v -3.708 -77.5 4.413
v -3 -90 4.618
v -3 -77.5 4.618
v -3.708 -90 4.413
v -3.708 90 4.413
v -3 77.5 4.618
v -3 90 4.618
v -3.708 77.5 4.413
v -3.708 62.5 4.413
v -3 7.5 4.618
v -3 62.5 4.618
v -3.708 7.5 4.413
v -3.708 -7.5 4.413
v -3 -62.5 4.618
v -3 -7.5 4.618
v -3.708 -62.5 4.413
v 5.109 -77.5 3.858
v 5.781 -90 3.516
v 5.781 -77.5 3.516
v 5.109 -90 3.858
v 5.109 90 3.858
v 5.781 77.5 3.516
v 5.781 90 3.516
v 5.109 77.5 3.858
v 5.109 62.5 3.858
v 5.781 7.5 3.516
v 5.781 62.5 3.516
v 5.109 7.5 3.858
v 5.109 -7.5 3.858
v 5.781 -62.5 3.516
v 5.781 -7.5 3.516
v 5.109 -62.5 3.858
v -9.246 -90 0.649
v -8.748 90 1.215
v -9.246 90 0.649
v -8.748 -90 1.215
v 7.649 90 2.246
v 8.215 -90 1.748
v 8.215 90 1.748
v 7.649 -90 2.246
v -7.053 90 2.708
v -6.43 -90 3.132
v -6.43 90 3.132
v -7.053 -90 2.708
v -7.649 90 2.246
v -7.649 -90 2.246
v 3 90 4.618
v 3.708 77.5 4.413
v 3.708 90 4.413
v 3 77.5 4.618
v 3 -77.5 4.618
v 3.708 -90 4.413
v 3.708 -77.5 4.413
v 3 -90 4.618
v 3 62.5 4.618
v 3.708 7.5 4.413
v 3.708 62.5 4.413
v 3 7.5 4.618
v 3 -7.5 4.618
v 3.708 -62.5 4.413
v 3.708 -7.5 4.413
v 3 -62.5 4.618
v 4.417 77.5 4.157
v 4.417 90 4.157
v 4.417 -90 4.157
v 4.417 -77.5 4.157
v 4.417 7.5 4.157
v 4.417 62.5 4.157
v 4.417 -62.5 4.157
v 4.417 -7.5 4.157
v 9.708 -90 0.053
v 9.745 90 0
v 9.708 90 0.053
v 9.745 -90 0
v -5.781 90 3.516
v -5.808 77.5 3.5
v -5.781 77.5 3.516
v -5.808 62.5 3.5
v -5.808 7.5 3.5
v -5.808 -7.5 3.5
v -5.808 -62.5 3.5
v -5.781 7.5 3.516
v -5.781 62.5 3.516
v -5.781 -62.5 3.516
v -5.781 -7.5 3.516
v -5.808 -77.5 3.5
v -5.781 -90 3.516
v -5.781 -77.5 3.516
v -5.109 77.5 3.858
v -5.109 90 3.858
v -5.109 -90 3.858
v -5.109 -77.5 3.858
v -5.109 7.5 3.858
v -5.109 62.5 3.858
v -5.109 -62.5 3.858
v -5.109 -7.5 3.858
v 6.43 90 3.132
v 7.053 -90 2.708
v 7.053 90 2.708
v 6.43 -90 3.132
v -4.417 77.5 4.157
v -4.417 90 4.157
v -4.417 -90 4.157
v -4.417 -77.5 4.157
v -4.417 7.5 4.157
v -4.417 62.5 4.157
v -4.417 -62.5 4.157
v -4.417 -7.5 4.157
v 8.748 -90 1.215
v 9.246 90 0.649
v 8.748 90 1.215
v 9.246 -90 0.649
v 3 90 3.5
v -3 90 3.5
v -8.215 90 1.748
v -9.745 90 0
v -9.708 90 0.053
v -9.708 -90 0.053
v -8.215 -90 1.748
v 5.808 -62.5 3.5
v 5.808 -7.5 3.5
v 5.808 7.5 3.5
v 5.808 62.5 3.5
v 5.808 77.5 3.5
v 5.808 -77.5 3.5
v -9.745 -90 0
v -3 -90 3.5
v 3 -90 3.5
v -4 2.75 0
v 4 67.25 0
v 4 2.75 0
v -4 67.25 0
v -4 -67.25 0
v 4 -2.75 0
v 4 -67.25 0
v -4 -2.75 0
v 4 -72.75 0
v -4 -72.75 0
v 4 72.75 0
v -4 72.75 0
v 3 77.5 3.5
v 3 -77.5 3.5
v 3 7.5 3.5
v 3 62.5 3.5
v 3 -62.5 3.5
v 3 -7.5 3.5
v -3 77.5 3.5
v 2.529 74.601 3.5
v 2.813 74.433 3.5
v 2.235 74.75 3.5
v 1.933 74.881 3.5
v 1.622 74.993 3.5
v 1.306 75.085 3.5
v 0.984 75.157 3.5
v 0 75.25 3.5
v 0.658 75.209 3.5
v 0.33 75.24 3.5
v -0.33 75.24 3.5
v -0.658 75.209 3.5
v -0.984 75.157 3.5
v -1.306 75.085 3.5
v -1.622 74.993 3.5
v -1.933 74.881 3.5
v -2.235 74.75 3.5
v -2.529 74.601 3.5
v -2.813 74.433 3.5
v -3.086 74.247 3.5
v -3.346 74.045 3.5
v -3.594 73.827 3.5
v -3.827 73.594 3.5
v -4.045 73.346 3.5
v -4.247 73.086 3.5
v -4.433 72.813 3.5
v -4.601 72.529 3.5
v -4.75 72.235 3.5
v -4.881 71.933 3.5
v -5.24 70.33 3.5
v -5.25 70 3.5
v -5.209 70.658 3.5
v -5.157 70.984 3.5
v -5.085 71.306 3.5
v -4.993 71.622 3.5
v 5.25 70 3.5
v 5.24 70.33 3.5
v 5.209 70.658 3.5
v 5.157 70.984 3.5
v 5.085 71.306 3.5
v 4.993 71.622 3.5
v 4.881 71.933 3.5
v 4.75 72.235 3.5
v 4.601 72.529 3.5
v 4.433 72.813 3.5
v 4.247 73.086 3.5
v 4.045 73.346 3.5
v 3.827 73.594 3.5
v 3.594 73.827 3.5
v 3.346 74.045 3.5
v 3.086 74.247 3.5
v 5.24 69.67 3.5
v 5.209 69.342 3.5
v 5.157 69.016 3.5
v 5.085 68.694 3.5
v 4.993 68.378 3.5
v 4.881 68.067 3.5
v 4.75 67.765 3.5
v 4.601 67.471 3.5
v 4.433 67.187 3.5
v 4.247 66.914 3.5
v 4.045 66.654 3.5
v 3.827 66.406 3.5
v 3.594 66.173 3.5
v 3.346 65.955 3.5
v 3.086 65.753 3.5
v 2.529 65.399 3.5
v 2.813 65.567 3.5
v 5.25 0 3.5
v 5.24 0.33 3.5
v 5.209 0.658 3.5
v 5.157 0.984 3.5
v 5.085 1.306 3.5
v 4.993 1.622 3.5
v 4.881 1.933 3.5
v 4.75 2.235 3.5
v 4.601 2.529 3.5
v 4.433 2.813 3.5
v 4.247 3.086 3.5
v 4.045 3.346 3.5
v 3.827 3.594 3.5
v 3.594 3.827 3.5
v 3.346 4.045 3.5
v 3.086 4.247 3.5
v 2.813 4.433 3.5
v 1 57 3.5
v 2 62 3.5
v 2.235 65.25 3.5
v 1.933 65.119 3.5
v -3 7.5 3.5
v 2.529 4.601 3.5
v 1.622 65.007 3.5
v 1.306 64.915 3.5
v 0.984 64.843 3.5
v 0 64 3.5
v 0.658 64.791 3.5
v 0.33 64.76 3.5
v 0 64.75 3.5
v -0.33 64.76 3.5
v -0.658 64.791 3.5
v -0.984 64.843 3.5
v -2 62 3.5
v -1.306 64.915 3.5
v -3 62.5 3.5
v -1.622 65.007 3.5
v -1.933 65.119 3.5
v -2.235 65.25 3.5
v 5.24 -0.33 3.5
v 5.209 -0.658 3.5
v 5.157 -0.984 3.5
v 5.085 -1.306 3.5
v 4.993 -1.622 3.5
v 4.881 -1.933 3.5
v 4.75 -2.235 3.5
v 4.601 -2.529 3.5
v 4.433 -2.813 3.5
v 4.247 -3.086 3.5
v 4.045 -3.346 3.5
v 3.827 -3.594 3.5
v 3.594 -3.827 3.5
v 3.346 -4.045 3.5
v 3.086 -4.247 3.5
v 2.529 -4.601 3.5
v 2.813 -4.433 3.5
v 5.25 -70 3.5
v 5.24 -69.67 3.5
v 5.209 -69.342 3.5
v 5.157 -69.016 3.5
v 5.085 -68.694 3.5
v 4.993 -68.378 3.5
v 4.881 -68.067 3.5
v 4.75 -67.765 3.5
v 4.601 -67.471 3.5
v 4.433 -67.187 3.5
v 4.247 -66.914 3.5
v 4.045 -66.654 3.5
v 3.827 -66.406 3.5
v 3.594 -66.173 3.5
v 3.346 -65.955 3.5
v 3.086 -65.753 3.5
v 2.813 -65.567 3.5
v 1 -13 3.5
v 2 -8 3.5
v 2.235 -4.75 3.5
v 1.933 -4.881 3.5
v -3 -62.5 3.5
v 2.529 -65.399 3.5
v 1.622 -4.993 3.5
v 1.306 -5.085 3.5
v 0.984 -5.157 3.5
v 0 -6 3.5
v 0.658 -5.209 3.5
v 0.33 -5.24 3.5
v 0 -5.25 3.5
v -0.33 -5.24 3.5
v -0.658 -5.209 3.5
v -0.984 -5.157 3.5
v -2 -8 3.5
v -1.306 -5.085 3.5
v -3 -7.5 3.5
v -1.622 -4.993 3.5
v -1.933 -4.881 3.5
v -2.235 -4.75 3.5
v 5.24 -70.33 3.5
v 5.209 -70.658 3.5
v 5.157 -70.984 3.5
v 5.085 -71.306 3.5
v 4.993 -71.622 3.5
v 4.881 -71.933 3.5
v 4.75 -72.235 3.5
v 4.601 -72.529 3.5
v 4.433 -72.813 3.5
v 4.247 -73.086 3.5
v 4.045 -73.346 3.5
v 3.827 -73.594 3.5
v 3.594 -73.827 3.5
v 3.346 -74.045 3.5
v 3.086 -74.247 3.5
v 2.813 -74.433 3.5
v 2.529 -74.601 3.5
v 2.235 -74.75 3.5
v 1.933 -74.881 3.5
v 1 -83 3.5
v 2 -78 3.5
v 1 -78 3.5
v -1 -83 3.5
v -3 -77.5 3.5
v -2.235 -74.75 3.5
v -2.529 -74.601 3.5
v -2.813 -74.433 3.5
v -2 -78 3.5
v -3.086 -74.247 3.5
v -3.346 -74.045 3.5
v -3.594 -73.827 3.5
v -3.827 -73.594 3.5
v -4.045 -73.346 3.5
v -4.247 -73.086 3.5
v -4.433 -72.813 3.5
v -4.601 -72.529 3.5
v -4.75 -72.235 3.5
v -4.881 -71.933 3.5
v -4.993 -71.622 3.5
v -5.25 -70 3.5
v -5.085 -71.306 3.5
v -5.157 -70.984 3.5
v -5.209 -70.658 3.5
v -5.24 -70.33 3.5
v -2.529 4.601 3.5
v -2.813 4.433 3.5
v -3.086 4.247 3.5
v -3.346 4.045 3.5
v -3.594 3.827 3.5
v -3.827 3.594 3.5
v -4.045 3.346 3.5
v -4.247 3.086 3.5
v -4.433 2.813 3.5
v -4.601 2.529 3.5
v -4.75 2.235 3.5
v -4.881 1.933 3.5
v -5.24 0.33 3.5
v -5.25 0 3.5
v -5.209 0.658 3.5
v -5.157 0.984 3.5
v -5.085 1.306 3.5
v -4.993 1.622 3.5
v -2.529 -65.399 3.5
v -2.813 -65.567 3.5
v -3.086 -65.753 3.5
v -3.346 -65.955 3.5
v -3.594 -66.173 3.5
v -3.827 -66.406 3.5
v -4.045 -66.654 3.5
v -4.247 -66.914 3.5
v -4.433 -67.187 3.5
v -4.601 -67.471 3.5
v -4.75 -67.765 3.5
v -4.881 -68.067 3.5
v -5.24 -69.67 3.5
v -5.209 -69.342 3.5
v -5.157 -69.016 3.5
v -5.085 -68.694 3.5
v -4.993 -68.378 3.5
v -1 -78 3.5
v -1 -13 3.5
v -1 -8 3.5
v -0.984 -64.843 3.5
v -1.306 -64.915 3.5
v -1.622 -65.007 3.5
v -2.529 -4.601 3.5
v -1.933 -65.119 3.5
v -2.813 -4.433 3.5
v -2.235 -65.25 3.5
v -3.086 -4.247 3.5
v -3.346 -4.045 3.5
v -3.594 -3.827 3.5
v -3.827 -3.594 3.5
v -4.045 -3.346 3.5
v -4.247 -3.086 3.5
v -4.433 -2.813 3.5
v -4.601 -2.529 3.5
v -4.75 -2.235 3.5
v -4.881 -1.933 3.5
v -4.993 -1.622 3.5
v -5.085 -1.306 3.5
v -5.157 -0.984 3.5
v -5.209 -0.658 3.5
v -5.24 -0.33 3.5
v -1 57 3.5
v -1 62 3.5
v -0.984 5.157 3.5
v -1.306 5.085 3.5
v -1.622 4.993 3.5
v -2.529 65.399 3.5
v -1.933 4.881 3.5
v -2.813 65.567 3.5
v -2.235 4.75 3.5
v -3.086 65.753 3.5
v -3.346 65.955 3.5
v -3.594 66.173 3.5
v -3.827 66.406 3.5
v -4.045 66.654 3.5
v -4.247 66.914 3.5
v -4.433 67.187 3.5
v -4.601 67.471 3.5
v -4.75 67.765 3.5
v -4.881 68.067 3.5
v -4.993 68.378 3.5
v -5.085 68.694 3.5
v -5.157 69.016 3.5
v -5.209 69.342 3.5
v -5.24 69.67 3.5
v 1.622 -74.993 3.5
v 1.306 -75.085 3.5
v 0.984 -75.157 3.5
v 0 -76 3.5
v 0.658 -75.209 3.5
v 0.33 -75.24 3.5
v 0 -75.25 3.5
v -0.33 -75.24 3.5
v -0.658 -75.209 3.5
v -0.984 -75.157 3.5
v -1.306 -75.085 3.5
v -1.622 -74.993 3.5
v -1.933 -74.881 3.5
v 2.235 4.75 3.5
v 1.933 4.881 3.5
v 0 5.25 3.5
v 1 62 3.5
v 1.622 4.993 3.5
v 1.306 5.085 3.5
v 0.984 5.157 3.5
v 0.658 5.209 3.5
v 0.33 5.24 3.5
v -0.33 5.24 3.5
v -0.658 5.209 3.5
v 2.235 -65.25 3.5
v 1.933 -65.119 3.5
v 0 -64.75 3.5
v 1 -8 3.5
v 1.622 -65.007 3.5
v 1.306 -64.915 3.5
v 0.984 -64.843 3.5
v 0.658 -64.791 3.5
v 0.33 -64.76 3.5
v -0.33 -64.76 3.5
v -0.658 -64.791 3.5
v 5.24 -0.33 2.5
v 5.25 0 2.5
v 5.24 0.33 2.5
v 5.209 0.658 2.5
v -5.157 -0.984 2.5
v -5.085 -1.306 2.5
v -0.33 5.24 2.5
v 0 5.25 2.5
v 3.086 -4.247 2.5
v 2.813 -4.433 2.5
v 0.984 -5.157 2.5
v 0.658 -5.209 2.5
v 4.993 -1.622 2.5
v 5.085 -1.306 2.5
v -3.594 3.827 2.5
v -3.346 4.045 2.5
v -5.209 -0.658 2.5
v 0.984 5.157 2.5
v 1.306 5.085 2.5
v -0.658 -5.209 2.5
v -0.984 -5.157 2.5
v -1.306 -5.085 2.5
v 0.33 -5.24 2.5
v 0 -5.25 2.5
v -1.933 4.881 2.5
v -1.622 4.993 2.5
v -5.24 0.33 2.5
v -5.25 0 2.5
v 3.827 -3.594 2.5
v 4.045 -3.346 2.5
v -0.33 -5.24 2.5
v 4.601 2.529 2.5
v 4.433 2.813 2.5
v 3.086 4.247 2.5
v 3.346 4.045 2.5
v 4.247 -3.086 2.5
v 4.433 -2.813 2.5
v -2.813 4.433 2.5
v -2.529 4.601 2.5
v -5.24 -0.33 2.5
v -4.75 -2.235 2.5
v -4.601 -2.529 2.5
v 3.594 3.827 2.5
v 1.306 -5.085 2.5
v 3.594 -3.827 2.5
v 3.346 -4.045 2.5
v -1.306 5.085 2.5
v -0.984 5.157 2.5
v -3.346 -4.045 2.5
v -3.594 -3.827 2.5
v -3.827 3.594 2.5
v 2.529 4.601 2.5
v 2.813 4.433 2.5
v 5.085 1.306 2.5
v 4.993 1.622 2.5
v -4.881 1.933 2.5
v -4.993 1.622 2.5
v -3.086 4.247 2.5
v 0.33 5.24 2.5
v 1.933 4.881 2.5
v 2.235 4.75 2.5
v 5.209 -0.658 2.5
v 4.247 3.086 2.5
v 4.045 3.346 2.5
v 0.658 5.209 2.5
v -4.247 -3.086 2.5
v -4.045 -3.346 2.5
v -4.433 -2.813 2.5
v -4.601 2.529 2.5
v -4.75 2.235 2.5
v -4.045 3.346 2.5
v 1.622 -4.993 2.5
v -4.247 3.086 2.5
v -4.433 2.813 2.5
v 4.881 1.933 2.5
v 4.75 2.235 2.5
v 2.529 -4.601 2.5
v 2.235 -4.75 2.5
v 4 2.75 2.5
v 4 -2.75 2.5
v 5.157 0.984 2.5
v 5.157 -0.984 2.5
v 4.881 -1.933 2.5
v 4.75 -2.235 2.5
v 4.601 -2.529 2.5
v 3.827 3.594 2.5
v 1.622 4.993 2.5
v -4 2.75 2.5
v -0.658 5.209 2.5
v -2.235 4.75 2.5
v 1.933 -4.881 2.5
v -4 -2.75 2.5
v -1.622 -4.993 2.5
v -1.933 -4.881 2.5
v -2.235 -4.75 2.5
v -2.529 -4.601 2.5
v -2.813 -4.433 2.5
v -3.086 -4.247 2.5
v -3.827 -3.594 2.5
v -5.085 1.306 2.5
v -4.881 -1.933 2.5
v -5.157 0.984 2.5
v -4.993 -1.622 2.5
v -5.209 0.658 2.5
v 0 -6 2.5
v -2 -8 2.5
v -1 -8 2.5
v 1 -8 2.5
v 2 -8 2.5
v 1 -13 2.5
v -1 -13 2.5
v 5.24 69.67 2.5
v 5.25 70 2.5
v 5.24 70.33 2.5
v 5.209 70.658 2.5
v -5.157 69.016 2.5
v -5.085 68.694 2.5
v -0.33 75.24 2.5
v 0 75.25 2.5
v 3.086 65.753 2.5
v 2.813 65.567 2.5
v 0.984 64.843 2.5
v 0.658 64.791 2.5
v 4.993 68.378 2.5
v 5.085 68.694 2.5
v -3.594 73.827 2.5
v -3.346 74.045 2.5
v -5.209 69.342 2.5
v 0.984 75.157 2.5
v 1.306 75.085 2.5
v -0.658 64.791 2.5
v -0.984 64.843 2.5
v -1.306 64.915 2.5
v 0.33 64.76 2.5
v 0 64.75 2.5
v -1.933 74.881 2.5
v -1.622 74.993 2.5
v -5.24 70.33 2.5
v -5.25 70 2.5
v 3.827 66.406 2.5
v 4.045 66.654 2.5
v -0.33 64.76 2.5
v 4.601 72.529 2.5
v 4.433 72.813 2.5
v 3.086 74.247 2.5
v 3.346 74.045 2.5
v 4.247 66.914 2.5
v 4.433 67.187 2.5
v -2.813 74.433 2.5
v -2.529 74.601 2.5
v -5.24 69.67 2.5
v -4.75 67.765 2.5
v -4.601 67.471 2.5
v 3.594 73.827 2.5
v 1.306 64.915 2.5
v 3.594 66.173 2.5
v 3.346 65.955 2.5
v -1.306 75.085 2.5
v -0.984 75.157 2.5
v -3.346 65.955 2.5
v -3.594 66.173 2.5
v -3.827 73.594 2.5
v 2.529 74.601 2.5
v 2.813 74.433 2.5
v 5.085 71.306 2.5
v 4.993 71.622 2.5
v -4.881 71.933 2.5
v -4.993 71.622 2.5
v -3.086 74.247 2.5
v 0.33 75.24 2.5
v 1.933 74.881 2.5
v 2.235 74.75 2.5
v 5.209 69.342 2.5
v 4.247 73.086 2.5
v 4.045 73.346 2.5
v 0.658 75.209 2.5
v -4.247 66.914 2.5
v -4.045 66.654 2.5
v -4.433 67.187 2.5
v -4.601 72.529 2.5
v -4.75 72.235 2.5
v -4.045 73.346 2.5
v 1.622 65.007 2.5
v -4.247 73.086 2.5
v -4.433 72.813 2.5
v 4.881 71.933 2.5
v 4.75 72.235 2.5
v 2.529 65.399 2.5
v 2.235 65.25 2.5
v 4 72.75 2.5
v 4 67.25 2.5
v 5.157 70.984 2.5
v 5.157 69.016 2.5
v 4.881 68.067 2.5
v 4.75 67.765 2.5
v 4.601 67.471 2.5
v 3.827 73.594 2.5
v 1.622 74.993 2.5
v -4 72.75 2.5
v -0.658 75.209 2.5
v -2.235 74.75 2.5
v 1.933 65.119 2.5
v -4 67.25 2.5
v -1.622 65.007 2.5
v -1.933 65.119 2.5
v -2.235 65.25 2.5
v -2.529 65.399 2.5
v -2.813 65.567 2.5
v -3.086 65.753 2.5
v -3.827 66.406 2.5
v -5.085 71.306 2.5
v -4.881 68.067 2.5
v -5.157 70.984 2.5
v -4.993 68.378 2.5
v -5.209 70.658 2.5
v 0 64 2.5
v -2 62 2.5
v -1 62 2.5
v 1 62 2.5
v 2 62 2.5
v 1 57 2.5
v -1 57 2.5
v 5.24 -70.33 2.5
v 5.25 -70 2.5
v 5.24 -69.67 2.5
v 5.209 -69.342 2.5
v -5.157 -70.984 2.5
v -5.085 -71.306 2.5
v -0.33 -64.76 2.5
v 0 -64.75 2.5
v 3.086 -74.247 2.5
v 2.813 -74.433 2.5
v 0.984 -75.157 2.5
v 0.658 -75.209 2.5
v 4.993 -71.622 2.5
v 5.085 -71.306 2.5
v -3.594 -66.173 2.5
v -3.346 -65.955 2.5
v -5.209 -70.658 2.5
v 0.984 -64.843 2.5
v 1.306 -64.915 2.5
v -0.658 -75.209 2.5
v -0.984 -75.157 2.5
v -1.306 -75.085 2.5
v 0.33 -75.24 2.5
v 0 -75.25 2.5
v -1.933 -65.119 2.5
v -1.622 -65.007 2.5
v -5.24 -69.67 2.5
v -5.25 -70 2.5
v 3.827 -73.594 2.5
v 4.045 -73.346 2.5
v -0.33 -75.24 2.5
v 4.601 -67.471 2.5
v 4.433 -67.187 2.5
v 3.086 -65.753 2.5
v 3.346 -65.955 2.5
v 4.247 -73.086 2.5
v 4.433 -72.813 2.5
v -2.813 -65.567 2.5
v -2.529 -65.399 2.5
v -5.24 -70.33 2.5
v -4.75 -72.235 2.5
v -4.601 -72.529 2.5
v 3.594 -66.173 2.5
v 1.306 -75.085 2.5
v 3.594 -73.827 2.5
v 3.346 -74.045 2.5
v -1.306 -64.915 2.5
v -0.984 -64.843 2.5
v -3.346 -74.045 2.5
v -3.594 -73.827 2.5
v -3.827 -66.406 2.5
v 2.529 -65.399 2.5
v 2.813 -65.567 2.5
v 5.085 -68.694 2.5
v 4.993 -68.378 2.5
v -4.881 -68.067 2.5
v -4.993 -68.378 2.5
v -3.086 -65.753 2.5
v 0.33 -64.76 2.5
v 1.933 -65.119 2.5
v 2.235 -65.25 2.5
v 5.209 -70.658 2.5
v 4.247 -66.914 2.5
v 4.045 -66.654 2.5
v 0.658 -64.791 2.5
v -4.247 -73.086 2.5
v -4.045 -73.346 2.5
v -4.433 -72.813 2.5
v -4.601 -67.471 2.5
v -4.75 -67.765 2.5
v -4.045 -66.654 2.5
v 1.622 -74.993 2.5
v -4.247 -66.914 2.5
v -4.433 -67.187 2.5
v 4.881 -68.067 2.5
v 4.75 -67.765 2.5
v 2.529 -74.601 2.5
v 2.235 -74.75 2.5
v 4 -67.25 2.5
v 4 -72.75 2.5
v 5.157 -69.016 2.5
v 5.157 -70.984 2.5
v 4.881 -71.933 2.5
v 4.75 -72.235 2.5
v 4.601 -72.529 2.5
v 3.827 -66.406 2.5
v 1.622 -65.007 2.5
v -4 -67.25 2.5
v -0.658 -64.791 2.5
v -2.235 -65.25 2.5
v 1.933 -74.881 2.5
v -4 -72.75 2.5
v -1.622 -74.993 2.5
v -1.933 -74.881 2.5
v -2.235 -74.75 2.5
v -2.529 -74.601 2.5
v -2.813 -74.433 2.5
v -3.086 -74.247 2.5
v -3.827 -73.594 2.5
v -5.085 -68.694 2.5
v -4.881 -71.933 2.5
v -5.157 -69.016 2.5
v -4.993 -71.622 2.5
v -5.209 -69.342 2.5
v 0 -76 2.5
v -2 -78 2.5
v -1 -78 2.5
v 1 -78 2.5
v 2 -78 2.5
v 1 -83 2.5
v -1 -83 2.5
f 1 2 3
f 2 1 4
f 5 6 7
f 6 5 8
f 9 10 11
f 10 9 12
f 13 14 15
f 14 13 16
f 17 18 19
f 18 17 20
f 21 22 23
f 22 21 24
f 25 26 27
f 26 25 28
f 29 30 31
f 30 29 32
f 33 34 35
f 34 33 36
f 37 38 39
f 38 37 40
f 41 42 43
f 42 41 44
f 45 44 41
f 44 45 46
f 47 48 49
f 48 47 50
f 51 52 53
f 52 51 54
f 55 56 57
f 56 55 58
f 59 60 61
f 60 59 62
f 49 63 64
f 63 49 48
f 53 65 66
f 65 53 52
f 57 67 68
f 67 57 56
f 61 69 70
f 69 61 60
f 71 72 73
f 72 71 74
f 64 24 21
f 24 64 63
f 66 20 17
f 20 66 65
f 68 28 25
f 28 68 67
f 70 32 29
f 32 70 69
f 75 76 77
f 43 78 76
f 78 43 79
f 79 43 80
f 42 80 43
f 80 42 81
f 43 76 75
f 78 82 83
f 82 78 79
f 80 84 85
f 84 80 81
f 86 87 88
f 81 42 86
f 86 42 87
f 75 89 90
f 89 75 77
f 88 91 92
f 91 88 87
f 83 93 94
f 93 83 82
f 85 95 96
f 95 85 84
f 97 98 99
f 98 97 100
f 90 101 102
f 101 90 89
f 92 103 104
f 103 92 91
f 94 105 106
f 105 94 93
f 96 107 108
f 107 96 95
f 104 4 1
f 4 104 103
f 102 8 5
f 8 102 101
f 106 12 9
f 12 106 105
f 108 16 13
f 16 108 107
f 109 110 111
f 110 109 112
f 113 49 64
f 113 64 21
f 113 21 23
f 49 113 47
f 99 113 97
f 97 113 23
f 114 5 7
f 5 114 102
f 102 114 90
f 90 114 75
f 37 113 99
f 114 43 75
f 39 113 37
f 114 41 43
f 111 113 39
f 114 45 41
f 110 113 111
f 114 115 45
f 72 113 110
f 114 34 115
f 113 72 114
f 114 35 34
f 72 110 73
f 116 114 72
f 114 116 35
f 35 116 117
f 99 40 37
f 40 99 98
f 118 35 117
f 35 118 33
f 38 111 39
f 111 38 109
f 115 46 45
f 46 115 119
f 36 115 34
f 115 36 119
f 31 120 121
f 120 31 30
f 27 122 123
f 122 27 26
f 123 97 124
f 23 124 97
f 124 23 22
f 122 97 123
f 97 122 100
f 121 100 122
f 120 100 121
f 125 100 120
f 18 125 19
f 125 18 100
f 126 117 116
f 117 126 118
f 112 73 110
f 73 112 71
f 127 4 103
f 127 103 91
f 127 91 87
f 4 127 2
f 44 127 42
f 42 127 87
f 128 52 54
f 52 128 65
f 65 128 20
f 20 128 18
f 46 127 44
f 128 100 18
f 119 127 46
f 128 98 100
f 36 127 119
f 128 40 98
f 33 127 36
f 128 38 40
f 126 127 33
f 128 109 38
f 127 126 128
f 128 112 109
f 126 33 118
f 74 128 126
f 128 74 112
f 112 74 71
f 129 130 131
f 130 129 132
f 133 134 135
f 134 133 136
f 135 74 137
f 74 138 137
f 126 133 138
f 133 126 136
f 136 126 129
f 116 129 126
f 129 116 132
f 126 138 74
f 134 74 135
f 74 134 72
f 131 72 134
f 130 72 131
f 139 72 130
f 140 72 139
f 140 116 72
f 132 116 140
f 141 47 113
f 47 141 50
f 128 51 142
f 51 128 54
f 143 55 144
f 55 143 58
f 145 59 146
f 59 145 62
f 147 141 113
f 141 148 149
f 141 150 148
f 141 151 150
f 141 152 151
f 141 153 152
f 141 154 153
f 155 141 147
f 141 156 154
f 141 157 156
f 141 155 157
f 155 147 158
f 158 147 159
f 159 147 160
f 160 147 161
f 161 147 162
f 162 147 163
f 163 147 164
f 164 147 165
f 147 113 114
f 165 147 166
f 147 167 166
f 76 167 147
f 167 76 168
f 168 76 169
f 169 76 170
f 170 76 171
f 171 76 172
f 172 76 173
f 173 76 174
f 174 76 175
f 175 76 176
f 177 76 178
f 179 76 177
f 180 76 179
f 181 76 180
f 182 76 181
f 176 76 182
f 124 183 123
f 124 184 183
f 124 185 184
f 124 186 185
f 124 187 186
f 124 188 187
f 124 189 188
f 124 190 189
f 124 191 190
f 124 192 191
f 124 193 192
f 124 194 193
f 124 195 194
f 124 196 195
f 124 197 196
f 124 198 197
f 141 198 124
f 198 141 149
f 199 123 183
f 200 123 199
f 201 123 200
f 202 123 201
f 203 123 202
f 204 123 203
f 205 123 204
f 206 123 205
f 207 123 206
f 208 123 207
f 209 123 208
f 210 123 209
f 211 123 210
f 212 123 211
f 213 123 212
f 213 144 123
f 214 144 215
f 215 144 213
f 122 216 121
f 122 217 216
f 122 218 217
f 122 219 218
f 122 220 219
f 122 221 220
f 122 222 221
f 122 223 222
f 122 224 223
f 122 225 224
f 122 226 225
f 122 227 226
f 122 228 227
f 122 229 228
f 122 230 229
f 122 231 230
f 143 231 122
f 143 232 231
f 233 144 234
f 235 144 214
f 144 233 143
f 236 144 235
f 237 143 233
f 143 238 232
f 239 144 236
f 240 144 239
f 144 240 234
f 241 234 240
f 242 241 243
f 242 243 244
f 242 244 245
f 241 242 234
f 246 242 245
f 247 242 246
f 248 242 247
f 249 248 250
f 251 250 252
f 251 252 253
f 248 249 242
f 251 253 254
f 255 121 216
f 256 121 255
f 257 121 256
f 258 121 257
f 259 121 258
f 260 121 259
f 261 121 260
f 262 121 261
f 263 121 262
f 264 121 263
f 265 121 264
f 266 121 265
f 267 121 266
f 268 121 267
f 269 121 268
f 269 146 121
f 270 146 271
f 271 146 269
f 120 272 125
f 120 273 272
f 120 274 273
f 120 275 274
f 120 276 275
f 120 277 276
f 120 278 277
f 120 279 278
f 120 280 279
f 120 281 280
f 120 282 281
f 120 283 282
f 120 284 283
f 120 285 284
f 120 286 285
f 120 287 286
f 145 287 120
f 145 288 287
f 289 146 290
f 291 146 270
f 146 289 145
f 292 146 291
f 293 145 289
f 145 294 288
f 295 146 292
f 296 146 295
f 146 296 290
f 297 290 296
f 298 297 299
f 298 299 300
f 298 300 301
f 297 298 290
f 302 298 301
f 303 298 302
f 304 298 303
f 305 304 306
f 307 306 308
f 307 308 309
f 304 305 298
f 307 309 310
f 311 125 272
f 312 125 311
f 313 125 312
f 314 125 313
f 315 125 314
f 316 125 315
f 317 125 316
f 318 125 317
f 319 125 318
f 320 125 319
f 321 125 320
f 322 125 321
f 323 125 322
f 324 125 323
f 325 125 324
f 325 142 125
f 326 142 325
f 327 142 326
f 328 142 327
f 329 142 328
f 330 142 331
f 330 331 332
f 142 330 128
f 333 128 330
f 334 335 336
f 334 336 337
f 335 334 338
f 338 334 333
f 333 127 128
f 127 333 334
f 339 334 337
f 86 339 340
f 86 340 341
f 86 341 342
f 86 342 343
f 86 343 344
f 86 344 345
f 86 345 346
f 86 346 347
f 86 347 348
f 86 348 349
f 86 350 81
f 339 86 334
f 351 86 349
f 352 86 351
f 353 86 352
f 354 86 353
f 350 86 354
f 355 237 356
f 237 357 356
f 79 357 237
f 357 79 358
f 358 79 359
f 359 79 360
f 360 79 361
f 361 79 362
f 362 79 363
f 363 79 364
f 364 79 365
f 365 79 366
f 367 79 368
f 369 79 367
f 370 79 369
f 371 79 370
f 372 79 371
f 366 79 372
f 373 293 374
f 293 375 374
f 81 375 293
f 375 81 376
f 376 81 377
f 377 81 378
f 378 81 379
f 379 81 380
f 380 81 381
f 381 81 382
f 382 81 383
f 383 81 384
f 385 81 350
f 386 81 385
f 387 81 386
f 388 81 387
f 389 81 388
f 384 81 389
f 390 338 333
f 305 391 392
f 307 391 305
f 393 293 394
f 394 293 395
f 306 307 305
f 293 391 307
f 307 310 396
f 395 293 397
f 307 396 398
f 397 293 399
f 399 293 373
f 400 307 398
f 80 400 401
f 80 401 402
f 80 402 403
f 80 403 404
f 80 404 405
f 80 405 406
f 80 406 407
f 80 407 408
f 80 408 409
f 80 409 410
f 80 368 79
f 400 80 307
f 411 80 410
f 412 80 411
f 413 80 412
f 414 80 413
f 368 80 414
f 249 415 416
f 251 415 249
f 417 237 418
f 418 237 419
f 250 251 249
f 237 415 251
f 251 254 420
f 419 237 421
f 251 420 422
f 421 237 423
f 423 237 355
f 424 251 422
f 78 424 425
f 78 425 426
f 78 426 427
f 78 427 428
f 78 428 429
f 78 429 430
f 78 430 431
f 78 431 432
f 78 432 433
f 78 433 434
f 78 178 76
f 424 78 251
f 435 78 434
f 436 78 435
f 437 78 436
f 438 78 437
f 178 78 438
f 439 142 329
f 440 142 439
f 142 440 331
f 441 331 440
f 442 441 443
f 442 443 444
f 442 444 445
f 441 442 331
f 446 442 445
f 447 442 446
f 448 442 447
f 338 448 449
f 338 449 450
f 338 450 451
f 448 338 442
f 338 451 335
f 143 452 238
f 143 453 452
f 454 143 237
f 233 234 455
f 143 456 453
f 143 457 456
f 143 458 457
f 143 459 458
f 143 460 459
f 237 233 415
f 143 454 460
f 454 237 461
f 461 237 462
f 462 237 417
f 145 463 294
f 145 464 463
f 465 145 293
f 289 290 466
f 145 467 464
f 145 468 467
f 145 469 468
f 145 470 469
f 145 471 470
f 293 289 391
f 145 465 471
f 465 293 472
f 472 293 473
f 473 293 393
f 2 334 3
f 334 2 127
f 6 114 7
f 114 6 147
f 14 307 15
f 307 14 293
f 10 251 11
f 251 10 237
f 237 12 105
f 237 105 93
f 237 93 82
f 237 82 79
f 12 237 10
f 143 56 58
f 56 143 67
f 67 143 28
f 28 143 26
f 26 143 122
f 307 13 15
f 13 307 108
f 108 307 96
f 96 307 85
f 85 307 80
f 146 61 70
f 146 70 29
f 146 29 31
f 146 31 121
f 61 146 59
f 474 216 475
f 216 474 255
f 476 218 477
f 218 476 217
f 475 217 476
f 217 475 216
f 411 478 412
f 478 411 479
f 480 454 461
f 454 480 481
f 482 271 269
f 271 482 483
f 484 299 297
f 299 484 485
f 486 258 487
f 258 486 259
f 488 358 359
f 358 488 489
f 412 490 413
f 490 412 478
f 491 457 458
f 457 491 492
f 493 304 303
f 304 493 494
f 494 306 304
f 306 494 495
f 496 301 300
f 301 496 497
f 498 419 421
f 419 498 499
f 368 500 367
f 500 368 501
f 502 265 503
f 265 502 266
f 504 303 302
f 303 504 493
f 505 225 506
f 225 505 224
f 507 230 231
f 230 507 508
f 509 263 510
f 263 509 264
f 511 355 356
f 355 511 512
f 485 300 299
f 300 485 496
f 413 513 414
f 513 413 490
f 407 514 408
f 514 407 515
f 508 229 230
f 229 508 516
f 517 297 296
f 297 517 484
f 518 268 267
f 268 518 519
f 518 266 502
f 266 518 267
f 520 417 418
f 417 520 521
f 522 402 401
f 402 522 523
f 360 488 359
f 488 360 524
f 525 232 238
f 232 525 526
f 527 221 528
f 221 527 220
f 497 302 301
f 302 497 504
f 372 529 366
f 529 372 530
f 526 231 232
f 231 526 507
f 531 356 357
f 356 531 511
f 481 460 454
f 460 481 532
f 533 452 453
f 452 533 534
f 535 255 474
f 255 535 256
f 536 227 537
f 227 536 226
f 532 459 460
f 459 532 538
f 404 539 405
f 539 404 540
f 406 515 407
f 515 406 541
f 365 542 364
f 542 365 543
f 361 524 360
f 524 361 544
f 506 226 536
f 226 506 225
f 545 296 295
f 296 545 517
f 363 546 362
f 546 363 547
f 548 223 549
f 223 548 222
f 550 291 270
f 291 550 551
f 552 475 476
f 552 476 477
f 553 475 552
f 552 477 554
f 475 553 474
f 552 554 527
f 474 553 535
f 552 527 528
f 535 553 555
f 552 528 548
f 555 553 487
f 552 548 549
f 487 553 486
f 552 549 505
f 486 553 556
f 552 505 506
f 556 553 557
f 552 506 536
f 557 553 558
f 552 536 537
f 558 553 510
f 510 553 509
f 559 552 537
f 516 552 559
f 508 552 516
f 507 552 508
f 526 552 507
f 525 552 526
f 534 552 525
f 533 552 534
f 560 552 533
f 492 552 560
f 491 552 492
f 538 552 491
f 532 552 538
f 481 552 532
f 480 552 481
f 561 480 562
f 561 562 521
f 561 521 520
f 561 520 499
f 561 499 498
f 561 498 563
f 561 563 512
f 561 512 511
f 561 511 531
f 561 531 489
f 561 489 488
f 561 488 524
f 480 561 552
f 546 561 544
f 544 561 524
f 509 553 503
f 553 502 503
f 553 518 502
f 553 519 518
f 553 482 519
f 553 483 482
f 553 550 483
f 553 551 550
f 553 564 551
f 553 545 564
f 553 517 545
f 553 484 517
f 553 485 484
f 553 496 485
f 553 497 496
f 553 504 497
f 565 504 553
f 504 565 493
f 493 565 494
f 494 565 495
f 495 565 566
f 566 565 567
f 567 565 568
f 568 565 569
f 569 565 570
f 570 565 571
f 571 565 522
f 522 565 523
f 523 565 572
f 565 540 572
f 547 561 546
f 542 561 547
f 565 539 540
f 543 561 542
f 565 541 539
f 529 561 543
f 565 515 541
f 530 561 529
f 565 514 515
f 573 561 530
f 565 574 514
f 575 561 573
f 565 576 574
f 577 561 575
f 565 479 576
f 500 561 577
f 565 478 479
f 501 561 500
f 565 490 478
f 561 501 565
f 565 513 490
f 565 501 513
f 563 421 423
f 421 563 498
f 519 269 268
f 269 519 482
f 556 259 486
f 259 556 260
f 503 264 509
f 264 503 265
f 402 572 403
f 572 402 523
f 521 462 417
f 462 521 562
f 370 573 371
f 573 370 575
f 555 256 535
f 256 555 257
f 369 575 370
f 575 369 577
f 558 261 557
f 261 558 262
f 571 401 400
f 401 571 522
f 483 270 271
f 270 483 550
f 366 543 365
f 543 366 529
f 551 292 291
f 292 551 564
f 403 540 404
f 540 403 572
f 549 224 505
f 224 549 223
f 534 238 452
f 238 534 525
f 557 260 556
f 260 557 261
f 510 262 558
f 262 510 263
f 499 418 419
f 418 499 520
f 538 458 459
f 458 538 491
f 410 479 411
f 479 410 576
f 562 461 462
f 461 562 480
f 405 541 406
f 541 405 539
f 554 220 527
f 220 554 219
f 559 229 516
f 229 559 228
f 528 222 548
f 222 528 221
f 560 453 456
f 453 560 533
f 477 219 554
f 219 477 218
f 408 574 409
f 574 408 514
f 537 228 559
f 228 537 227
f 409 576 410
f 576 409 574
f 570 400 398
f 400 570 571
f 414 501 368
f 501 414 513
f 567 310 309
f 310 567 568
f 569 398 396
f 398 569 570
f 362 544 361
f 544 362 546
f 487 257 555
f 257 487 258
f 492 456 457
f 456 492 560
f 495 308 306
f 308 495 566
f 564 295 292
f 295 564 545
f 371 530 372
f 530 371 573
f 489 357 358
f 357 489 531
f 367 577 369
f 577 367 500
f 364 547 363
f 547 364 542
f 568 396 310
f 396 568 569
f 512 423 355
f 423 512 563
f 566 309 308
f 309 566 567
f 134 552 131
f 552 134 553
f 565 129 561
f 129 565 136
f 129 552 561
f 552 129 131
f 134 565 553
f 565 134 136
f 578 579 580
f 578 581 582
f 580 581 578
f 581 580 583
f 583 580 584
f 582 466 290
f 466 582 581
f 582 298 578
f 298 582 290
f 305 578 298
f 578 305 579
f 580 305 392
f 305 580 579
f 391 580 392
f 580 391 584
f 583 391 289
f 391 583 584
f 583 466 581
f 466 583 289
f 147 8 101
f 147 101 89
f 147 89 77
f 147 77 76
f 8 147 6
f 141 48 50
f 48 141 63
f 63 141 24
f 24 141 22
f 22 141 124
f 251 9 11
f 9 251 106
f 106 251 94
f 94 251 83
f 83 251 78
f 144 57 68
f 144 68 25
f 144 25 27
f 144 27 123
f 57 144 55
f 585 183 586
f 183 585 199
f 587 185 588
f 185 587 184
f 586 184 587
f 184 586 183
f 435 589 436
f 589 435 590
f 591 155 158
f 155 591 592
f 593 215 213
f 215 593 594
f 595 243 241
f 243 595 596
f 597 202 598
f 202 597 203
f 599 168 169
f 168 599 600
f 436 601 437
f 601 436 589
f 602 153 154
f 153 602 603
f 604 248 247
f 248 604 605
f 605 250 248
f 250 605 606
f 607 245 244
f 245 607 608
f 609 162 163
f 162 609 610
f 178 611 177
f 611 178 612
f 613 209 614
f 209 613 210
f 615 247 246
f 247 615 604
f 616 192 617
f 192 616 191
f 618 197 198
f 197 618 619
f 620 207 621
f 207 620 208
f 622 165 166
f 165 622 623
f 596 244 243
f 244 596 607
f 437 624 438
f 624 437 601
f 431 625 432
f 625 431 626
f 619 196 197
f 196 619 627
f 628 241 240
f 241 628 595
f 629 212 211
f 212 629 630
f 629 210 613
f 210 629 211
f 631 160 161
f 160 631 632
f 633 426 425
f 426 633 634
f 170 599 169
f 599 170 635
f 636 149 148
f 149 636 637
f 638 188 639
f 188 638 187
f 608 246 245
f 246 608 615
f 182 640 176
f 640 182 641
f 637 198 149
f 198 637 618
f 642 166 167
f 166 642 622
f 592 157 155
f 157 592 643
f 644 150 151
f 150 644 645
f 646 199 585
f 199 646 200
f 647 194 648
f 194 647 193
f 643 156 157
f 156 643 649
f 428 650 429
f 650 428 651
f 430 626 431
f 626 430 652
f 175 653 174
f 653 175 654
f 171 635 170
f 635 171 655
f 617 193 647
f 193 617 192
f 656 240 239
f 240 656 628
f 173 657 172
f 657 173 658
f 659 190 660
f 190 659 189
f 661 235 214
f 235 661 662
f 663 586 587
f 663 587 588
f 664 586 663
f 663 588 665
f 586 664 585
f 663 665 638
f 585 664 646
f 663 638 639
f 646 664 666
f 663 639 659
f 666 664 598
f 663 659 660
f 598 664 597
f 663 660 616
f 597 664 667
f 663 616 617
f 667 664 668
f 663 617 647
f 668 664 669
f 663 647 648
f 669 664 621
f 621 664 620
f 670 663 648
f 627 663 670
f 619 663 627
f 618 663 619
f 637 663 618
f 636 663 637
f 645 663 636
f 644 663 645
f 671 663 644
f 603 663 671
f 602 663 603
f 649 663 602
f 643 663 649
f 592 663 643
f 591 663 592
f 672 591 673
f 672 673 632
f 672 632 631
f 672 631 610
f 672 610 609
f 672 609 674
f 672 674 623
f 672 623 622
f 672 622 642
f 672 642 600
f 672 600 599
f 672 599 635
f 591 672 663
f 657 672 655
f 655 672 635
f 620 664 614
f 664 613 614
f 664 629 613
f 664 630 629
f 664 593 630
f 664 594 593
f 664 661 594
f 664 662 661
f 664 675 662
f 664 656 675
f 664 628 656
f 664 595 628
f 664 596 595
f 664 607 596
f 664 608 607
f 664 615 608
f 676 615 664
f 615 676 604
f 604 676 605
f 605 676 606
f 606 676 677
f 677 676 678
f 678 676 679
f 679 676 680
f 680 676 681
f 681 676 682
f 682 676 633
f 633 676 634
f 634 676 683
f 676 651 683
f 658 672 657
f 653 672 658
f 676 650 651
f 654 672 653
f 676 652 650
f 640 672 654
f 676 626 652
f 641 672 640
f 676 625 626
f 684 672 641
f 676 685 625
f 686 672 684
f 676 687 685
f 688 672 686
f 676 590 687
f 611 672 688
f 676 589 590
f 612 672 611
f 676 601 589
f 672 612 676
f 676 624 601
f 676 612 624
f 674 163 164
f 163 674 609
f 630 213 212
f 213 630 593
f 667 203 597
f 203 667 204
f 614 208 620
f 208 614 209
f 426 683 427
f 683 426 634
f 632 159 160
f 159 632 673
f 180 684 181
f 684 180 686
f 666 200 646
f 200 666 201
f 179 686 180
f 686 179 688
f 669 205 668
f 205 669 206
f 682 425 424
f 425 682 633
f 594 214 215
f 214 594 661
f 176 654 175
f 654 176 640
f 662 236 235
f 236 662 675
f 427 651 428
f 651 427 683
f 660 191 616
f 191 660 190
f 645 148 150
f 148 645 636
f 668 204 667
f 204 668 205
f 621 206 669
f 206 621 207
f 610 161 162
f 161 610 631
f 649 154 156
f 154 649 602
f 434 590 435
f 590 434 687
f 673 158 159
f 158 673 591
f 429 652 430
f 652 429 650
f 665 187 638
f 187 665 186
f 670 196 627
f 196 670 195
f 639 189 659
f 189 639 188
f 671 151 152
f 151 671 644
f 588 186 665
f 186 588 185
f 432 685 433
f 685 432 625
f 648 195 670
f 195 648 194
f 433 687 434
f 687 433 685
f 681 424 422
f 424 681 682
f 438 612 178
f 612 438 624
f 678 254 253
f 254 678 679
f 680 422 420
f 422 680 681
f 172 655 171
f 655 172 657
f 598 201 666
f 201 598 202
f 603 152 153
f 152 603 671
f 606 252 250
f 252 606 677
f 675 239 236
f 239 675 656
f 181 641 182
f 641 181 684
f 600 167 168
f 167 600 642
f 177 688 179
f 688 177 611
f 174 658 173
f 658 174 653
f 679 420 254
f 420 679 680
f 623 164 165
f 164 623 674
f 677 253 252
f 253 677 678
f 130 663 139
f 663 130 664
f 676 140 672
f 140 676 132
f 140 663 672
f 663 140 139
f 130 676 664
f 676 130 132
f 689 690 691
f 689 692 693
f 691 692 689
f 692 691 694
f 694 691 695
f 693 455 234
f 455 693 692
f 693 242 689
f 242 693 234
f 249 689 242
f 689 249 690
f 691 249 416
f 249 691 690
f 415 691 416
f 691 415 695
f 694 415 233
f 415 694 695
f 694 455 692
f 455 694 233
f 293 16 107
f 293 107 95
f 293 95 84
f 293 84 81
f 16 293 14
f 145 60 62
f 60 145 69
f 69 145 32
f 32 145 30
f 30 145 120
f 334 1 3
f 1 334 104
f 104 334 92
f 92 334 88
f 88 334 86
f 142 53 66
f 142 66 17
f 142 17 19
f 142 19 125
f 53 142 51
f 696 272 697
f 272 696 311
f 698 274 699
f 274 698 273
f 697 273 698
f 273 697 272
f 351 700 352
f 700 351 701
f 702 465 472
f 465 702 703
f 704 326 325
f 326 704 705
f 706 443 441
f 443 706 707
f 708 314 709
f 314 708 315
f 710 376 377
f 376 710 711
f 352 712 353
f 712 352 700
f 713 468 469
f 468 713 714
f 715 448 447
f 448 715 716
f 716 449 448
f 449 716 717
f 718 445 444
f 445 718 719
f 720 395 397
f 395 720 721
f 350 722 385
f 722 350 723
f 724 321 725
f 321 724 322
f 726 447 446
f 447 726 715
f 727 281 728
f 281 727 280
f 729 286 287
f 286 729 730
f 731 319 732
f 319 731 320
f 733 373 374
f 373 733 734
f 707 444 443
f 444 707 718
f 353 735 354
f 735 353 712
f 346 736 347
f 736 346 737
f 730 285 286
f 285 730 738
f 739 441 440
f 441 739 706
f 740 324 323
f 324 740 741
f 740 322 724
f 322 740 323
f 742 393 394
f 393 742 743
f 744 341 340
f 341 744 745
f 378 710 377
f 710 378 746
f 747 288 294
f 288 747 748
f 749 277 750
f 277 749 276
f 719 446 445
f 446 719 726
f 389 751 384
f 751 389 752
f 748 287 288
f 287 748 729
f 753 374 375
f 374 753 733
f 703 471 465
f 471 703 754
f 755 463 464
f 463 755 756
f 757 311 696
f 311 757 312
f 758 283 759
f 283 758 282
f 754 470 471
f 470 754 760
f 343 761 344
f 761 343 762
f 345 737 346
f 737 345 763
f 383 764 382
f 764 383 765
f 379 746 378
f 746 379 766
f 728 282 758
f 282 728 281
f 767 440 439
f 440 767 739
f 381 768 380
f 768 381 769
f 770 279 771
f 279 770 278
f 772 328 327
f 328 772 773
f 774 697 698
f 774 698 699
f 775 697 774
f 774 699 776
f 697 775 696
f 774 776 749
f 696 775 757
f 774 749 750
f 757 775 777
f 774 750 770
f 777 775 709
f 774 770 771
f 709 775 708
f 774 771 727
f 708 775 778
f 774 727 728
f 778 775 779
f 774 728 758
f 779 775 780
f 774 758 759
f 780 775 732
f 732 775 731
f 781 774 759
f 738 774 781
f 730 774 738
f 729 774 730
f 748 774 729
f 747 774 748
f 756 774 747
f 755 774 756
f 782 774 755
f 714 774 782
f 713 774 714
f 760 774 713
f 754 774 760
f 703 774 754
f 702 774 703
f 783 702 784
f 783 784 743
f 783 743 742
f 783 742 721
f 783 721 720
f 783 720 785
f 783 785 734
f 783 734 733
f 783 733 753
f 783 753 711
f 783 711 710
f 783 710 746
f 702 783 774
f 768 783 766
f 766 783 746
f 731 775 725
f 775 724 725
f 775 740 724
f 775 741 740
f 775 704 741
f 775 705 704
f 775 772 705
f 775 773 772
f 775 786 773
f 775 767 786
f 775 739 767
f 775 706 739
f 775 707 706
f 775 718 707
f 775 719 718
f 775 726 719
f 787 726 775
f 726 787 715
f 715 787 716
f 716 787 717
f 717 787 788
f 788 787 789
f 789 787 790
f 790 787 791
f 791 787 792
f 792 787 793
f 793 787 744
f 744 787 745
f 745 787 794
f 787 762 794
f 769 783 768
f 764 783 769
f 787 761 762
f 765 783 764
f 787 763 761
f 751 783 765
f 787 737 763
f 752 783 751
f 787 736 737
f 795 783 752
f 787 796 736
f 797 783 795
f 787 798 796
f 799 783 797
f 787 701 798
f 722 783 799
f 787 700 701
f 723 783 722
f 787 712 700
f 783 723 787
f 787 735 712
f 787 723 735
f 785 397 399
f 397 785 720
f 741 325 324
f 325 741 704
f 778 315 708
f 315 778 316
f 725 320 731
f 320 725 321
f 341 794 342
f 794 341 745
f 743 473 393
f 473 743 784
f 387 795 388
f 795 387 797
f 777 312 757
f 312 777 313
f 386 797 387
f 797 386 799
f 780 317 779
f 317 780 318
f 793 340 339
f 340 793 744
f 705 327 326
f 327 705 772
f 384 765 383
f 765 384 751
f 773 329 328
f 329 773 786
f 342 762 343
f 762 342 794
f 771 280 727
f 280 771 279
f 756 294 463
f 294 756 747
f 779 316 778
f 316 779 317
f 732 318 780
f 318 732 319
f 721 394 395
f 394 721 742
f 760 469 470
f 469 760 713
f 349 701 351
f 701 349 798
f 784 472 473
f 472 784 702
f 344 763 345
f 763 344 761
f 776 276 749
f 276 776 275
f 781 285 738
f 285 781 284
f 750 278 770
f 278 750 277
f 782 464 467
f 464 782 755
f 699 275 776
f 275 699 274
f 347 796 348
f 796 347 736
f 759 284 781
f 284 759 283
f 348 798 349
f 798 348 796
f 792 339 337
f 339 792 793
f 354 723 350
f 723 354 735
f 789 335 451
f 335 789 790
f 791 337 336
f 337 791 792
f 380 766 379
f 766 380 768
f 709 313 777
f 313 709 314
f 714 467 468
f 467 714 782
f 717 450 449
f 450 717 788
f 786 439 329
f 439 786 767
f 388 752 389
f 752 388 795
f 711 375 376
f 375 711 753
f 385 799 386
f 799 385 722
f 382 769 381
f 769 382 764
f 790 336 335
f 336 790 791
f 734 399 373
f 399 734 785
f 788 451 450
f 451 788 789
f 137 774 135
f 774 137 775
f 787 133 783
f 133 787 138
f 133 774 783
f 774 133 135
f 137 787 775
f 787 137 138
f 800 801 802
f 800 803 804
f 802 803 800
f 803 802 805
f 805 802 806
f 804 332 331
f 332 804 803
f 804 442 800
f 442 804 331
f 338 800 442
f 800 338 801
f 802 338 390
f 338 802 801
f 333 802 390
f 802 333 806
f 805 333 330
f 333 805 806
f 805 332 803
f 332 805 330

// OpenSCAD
/* [Parameters for LED jig] */
//Gap between LEDs
gap = 70;//[10:0.5:150]

/* [Hidden] */
Base_length = 2*gap+40;
difference(){
difference(){
difference(){
Base();
translate([0,0,5.5])
LEDhole();
}
translate([0,gap,5.5])
LEDhole();
}
translate([0,-gap,5.5])
LEDhole();
}
module LEDhole(){
union(){
cube(size = [15,15,4], center = true);
translate([0,0,-1])
    cylinder(h = 4, r=5.25, center = true, $fn = 100);
translate([0,0,-5])
    cube(size = [8,5.5,5.5], center = true);
}
translate([0,-13,-3])
linear_extrude(height = 1, center = false, convexity = 10, twist = 0)
polygon([[-1,0],[-1,5],[-2,5],[0,7],[2,5],[1,5],[1,0]]);
}
module Base(){
translate([0,0,-7])
//difference(){
difference(){
difference(){
rotate([90,0,0])
cylinder(h = Base_length, r=12, center = true, $fn = 100);
translate([0,0,-13])
cube(size = [40,Base_length+1,40], center = true);
}
translate([0,0,11.25])
cube(size = [6,Base_length+1,1.5], center = true);
}}
